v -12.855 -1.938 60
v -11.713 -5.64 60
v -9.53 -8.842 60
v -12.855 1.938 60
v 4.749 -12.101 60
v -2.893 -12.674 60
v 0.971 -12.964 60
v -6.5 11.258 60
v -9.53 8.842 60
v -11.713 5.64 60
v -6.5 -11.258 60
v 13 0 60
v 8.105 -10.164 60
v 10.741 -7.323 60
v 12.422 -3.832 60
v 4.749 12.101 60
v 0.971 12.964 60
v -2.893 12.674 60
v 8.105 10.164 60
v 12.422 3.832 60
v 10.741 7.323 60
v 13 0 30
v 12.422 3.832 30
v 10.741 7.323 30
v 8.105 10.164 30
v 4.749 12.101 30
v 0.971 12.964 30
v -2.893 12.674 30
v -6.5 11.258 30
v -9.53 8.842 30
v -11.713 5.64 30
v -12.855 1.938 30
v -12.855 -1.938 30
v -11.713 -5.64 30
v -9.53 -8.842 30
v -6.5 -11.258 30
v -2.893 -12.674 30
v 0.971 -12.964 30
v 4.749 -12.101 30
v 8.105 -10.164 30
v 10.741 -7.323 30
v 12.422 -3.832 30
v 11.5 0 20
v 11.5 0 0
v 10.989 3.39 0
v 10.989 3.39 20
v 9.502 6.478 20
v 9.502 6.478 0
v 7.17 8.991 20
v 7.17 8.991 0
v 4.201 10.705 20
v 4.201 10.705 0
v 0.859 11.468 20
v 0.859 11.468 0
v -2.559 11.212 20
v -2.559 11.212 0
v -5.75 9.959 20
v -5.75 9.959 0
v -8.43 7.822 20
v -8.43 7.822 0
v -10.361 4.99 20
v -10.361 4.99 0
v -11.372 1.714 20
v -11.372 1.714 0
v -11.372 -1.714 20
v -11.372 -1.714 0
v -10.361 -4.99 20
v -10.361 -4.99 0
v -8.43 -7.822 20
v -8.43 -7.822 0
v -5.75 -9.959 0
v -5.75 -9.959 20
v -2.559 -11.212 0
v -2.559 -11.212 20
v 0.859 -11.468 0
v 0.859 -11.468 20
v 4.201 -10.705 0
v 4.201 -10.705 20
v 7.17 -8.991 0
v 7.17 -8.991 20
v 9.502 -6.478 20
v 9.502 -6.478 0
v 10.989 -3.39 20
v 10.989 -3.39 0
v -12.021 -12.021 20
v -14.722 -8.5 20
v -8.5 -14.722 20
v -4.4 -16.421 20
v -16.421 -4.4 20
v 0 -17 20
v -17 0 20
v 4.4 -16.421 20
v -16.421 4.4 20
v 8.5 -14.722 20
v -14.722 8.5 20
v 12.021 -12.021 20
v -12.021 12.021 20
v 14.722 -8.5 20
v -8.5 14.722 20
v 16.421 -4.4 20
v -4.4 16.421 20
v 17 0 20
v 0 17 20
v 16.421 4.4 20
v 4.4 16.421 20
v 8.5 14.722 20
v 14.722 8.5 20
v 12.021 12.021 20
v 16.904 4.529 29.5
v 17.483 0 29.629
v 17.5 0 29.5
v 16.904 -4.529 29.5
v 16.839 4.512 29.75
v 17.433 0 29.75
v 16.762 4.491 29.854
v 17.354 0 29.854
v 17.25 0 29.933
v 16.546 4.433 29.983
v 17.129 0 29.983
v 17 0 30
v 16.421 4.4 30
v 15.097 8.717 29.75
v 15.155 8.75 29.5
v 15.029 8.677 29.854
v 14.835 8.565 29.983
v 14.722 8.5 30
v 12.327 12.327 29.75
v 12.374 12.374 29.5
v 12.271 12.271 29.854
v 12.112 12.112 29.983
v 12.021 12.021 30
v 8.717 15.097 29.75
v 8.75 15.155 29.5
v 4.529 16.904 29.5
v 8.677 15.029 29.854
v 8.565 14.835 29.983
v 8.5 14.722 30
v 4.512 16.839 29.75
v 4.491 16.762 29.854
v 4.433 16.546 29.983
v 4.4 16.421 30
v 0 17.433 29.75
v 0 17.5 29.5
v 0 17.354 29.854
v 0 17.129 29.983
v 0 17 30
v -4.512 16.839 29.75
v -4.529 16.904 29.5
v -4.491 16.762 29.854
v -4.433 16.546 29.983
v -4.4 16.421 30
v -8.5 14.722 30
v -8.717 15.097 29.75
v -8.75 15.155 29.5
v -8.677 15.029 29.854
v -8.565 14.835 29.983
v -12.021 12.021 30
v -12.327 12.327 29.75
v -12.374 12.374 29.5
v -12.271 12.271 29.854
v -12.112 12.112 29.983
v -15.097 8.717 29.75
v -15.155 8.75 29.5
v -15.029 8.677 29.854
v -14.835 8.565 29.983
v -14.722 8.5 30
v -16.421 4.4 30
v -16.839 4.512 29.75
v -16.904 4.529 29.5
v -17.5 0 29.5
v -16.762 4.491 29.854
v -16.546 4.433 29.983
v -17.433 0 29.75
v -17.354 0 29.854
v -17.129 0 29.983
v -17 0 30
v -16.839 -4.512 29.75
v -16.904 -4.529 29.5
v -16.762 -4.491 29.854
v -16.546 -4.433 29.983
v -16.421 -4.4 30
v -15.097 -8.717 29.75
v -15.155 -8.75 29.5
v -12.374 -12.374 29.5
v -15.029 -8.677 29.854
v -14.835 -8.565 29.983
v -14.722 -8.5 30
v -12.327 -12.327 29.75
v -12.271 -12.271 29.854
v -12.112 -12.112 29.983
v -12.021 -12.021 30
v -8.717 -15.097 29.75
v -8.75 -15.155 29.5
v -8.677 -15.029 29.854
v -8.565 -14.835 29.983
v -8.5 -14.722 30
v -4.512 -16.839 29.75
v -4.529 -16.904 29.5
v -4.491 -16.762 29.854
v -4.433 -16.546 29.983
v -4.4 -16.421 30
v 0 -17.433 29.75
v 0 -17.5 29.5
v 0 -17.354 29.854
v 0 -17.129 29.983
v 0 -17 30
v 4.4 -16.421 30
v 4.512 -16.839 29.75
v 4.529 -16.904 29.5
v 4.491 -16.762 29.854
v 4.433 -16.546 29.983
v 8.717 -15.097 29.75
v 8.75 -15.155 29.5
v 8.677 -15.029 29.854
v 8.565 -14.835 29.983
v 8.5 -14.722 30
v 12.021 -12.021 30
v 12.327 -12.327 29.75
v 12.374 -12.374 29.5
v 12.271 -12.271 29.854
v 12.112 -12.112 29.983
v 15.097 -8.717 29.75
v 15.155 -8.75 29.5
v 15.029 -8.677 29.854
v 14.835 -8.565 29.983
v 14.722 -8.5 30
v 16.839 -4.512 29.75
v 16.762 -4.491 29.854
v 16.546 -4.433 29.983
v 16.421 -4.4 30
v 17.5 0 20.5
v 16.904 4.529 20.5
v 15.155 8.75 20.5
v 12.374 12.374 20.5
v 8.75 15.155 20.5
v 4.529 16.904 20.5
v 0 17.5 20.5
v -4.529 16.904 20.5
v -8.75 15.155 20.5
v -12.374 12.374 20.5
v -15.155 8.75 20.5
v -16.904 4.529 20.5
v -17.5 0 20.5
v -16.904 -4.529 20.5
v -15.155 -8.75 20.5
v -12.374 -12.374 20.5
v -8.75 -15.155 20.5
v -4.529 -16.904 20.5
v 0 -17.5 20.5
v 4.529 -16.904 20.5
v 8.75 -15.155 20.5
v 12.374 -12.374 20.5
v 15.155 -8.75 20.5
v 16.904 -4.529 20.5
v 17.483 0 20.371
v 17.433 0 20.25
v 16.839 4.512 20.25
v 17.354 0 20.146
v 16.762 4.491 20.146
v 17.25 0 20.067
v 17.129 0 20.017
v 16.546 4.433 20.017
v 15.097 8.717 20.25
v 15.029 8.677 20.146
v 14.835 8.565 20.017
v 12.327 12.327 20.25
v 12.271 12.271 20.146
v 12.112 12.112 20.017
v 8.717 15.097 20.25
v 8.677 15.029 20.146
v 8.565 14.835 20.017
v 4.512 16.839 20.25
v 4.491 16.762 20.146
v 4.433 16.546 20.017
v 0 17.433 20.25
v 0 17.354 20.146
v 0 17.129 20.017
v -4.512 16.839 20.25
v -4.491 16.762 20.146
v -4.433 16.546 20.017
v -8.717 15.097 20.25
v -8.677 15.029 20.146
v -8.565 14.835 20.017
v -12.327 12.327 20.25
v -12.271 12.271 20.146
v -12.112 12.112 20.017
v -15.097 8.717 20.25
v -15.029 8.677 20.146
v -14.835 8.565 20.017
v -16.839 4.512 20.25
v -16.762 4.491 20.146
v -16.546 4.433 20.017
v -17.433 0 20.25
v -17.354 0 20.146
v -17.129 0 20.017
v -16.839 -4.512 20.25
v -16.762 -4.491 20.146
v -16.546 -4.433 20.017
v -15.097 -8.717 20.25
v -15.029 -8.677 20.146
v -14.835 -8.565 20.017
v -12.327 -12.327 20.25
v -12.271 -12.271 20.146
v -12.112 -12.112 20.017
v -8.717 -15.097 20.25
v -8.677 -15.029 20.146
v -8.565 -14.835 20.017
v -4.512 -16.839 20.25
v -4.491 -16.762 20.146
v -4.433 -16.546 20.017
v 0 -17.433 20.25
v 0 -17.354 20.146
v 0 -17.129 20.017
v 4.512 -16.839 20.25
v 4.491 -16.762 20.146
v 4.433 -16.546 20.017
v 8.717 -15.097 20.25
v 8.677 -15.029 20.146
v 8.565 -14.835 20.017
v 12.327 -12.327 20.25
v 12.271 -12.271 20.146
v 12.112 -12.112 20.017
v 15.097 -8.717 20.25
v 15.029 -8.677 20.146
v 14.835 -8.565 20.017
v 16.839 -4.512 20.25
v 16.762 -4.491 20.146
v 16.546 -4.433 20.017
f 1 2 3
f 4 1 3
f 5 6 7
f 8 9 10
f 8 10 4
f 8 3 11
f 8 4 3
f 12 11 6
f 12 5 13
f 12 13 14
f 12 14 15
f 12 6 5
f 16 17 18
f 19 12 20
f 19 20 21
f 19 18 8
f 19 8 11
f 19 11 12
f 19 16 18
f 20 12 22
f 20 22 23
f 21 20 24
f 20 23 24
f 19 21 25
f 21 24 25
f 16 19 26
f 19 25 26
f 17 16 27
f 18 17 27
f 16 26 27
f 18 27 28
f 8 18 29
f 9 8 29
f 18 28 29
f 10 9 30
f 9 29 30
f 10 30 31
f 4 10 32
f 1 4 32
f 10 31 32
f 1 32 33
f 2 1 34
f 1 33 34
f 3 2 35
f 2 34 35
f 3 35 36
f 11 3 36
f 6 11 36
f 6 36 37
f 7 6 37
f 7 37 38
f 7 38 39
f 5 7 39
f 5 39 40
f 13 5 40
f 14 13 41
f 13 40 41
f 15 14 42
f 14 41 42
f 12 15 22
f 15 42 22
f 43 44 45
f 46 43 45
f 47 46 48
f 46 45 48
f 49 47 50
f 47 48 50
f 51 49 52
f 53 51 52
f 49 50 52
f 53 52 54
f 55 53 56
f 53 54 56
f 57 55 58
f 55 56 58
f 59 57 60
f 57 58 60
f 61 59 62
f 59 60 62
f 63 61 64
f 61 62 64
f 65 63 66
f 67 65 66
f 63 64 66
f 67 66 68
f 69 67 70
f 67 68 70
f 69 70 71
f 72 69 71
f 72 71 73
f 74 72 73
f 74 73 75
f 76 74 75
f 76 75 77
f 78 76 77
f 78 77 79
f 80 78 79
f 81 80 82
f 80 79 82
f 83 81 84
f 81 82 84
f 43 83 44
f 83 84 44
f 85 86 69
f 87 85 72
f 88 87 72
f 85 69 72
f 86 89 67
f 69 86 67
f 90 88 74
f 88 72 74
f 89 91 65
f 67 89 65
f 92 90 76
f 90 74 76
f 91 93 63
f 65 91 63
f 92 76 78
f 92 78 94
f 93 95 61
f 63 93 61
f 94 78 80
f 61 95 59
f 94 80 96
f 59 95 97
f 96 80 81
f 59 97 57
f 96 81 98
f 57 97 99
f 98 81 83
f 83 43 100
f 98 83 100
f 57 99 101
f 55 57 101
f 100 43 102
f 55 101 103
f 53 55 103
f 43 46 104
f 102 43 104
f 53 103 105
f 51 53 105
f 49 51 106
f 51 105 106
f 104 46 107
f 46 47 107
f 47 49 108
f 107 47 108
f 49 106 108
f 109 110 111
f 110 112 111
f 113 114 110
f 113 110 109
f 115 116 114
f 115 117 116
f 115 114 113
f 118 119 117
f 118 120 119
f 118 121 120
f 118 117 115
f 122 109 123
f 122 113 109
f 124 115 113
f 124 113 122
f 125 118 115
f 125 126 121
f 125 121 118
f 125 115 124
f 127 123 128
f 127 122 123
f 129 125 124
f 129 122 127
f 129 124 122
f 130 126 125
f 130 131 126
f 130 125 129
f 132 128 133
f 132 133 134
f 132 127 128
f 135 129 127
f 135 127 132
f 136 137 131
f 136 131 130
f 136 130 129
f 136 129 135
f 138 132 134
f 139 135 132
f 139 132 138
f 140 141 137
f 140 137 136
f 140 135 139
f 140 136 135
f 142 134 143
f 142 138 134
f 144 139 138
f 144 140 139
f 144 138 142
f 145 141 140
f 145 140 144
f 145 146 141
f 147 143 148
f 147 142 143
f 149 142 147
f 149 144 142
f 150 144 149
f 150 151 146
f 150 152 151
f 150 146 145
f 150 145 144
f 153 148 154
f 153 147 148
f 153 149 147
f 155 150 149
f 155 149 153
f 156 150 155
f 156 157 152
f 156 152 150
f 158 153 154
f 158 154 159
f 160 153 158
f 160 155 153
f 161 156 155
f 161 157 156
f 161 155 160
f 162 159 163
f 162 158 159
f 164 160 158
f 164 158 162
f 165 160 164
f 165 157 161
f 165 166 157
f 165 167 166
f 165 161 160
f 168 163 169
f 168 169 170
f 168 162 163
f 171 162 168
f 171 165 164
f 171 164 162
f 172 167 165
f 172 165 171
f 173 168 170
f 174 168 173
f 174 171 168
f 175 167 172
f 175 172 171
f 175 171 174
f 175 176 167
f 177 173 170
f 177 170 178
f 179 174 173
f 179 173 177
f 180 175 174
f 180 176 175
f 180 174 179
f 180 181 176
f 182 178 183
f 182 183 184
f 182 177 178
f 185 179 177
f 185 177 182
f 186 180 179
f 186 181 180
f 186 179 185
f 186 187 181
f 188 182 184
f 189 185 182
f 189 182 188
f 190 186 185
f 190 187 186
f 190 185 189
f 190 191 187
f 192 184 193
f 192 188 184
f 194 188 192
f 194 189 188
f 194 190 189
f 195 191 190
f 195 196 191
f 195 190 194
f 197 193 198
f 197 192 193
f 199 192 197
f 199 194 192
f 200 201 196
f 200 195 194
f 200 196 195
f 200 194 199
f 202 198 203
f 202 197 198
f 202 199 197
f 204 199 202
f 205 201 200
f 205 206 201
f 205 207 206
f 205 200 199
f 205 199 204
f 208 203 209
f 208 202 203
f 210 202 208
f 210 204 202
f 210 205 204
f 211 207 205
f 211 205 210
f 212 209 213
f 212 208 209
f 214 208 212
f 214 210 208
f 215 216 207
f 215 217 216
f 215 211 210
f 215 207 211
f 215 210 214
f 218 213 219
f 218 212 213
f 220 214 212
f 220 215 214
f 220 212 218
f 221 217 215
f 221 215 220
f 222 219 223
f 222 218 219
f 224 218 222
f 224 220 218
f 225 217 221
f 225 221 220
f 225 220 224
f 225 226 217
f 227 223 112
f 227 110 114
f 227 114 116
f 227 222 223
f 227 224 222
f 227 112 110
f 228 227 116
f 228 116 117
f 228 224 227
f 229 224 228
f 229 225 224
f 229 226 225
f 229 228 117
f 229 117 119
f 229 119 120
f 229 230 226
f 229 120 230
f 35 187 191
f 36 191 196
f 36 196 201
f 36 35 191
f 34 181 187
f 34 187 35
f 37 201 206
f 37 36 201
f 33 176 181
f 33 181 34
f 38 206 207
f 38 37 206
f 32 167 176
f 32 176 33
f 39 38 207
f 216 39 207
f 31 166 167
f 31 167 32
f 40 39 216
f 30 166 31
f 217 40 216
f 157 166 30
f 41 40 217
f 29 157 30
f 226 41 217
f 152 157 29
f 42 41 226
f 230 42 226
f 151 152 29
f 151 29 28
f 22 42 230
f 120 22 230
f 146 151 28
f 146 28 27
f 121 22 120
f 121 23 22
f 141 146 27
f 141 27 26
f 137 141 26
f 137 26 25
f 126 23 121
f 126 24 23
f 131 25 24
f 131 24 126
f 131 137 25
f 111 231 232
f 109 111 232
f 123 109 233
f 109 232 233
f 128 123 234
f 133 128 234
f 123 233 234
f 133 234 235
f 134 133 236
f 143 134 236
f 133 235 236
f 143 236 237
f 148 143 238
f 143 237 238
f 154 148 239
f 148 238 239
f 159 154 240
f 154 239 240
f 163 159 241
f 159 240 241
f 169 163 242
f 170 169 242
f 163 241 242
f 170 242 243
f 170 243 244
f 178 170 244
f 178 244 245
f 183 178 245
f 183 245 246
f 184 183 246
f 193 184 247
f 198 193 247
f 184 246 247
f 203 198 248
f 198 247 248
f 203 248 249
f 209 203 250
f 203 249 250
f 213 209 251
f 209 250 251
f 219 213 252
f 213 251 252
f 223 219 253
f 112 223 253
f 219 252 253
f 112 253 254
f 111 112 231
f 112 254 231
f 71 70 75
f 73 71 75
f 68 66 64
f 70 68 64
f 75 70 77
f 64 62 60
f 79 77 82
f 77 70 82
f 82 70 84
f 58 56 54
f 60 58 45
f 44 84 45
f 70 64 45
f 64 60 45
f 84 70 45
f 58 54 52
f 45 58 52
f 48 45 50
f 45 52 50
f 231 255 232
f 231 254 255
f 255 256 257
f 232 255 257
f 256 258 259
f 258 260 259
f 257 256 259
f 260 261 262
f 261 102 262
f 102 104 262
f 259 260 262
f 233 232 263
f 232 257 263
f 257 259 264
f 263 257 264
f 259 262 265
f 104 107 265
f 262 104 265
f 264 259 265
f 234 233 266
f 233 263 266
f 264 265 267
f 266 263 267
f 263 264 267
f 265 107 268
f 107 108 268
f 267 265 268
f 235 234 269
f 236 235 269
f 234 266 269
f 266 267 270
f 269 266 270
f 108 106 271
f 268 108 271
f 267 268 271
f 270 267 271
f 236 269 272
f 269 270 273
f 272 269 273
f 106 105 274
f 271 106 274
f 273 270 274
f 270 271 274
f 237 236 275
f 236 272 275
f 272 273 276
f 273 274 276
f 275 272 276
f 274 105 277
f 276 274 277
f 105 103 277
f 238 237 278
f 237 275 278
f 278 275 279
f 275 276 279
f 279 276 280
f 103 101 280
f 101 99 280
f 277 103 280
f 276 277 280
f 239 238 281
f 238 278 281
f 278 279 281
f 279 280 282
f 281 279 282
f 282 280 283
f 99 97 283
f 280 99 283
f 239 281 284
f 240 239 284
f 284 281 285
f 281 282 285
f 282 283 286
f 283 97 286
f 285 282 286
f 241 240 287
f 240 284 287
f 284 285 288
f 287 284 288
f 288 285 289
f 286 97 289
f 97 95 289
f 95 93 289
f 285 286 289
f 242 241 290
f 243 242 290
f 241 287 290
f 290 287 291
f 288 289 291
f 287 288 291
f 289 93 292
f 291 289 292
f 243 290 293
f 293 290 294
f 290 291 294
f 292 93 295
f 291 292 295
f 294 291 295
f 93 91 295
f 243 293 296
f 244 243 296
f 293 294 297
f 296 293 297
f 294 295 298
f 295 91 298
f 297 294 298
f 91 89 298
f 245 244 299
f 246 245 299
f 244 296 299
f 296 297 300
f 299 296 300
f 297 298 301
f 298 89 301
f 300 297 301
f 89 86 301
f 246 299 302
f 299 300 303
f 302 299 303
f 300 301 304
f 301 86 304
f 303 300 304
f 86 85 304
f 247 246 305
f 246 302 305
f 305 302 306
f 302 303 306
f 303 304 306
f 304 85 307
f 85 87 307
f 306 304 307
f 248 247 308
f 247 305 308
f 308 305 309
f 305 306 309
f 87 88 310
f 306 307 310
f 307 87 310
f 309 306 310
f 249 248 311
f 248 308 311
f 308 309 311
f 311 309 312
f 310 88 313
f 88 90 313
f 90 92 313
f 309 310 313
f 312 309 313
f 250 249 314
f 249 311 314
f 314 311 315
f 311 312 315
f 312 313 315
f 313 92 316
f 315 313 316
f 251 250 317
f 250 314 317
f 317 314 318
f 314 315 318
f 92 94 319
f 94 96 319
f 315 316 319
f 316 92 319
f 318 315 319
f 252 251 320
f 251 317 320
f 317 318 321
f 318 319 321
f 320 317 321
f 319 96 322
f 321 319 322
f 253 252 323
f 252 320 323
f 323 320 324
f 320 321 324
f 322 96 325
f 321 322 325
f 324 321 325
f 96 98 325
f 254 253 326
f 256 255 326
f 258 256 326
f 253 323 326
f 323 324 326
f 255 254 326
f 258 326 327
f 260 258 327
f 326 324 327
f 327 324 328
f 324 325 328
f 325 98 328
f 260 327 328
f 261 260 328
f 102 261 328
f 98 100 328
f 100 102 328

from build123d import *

# Parameters (mm, degrees)
SKETCH1_R           = 11.5
BOSS_EXTRUDE1_DEPTH = 20
SKETCH2_R           = 17.5
BOSS_EXTRUDE2_DEPTH = 10
SKETCH3_R           = 13
BOSS_EXTRUDE3_DEPTH = 30
FILLET1_R           = 0.5


with BuildPart() as part:
    # Sketch1 → Boss-Extrude1 (new body)
    with BuildSketch(Plane.XY):
        Circle(SKETCH1_R)
    extrude(amount=BOSS_EXTRUDE1_DEPTH)

    # Sketch2 → Boss-Extrude2 (add)
    with BuildSketch(Plane.XY.offset(20)):
        Circle(SKETCH2_R)
    extrude(amount=BOSS_EXTRUDE2_DEPTH)

    # Sketch3 → Boss-Extrude3 (add)
    with BuildSketch(Plane.XY.offset(30)):
        Circle(SKETCH3_R)
    extrude(amount=BOSS_EXTRUDE3_DEPTH)

    # Fillet1
    fillet1_edges = [part.edges().sort_by_distance(p)[0] for p in [
        (-17.5, 0, 20),
        (-17.5, 0, 30),
    ]]
    fillet(fillet1_edges, radius=FILLET1_R)


solid = part.part
